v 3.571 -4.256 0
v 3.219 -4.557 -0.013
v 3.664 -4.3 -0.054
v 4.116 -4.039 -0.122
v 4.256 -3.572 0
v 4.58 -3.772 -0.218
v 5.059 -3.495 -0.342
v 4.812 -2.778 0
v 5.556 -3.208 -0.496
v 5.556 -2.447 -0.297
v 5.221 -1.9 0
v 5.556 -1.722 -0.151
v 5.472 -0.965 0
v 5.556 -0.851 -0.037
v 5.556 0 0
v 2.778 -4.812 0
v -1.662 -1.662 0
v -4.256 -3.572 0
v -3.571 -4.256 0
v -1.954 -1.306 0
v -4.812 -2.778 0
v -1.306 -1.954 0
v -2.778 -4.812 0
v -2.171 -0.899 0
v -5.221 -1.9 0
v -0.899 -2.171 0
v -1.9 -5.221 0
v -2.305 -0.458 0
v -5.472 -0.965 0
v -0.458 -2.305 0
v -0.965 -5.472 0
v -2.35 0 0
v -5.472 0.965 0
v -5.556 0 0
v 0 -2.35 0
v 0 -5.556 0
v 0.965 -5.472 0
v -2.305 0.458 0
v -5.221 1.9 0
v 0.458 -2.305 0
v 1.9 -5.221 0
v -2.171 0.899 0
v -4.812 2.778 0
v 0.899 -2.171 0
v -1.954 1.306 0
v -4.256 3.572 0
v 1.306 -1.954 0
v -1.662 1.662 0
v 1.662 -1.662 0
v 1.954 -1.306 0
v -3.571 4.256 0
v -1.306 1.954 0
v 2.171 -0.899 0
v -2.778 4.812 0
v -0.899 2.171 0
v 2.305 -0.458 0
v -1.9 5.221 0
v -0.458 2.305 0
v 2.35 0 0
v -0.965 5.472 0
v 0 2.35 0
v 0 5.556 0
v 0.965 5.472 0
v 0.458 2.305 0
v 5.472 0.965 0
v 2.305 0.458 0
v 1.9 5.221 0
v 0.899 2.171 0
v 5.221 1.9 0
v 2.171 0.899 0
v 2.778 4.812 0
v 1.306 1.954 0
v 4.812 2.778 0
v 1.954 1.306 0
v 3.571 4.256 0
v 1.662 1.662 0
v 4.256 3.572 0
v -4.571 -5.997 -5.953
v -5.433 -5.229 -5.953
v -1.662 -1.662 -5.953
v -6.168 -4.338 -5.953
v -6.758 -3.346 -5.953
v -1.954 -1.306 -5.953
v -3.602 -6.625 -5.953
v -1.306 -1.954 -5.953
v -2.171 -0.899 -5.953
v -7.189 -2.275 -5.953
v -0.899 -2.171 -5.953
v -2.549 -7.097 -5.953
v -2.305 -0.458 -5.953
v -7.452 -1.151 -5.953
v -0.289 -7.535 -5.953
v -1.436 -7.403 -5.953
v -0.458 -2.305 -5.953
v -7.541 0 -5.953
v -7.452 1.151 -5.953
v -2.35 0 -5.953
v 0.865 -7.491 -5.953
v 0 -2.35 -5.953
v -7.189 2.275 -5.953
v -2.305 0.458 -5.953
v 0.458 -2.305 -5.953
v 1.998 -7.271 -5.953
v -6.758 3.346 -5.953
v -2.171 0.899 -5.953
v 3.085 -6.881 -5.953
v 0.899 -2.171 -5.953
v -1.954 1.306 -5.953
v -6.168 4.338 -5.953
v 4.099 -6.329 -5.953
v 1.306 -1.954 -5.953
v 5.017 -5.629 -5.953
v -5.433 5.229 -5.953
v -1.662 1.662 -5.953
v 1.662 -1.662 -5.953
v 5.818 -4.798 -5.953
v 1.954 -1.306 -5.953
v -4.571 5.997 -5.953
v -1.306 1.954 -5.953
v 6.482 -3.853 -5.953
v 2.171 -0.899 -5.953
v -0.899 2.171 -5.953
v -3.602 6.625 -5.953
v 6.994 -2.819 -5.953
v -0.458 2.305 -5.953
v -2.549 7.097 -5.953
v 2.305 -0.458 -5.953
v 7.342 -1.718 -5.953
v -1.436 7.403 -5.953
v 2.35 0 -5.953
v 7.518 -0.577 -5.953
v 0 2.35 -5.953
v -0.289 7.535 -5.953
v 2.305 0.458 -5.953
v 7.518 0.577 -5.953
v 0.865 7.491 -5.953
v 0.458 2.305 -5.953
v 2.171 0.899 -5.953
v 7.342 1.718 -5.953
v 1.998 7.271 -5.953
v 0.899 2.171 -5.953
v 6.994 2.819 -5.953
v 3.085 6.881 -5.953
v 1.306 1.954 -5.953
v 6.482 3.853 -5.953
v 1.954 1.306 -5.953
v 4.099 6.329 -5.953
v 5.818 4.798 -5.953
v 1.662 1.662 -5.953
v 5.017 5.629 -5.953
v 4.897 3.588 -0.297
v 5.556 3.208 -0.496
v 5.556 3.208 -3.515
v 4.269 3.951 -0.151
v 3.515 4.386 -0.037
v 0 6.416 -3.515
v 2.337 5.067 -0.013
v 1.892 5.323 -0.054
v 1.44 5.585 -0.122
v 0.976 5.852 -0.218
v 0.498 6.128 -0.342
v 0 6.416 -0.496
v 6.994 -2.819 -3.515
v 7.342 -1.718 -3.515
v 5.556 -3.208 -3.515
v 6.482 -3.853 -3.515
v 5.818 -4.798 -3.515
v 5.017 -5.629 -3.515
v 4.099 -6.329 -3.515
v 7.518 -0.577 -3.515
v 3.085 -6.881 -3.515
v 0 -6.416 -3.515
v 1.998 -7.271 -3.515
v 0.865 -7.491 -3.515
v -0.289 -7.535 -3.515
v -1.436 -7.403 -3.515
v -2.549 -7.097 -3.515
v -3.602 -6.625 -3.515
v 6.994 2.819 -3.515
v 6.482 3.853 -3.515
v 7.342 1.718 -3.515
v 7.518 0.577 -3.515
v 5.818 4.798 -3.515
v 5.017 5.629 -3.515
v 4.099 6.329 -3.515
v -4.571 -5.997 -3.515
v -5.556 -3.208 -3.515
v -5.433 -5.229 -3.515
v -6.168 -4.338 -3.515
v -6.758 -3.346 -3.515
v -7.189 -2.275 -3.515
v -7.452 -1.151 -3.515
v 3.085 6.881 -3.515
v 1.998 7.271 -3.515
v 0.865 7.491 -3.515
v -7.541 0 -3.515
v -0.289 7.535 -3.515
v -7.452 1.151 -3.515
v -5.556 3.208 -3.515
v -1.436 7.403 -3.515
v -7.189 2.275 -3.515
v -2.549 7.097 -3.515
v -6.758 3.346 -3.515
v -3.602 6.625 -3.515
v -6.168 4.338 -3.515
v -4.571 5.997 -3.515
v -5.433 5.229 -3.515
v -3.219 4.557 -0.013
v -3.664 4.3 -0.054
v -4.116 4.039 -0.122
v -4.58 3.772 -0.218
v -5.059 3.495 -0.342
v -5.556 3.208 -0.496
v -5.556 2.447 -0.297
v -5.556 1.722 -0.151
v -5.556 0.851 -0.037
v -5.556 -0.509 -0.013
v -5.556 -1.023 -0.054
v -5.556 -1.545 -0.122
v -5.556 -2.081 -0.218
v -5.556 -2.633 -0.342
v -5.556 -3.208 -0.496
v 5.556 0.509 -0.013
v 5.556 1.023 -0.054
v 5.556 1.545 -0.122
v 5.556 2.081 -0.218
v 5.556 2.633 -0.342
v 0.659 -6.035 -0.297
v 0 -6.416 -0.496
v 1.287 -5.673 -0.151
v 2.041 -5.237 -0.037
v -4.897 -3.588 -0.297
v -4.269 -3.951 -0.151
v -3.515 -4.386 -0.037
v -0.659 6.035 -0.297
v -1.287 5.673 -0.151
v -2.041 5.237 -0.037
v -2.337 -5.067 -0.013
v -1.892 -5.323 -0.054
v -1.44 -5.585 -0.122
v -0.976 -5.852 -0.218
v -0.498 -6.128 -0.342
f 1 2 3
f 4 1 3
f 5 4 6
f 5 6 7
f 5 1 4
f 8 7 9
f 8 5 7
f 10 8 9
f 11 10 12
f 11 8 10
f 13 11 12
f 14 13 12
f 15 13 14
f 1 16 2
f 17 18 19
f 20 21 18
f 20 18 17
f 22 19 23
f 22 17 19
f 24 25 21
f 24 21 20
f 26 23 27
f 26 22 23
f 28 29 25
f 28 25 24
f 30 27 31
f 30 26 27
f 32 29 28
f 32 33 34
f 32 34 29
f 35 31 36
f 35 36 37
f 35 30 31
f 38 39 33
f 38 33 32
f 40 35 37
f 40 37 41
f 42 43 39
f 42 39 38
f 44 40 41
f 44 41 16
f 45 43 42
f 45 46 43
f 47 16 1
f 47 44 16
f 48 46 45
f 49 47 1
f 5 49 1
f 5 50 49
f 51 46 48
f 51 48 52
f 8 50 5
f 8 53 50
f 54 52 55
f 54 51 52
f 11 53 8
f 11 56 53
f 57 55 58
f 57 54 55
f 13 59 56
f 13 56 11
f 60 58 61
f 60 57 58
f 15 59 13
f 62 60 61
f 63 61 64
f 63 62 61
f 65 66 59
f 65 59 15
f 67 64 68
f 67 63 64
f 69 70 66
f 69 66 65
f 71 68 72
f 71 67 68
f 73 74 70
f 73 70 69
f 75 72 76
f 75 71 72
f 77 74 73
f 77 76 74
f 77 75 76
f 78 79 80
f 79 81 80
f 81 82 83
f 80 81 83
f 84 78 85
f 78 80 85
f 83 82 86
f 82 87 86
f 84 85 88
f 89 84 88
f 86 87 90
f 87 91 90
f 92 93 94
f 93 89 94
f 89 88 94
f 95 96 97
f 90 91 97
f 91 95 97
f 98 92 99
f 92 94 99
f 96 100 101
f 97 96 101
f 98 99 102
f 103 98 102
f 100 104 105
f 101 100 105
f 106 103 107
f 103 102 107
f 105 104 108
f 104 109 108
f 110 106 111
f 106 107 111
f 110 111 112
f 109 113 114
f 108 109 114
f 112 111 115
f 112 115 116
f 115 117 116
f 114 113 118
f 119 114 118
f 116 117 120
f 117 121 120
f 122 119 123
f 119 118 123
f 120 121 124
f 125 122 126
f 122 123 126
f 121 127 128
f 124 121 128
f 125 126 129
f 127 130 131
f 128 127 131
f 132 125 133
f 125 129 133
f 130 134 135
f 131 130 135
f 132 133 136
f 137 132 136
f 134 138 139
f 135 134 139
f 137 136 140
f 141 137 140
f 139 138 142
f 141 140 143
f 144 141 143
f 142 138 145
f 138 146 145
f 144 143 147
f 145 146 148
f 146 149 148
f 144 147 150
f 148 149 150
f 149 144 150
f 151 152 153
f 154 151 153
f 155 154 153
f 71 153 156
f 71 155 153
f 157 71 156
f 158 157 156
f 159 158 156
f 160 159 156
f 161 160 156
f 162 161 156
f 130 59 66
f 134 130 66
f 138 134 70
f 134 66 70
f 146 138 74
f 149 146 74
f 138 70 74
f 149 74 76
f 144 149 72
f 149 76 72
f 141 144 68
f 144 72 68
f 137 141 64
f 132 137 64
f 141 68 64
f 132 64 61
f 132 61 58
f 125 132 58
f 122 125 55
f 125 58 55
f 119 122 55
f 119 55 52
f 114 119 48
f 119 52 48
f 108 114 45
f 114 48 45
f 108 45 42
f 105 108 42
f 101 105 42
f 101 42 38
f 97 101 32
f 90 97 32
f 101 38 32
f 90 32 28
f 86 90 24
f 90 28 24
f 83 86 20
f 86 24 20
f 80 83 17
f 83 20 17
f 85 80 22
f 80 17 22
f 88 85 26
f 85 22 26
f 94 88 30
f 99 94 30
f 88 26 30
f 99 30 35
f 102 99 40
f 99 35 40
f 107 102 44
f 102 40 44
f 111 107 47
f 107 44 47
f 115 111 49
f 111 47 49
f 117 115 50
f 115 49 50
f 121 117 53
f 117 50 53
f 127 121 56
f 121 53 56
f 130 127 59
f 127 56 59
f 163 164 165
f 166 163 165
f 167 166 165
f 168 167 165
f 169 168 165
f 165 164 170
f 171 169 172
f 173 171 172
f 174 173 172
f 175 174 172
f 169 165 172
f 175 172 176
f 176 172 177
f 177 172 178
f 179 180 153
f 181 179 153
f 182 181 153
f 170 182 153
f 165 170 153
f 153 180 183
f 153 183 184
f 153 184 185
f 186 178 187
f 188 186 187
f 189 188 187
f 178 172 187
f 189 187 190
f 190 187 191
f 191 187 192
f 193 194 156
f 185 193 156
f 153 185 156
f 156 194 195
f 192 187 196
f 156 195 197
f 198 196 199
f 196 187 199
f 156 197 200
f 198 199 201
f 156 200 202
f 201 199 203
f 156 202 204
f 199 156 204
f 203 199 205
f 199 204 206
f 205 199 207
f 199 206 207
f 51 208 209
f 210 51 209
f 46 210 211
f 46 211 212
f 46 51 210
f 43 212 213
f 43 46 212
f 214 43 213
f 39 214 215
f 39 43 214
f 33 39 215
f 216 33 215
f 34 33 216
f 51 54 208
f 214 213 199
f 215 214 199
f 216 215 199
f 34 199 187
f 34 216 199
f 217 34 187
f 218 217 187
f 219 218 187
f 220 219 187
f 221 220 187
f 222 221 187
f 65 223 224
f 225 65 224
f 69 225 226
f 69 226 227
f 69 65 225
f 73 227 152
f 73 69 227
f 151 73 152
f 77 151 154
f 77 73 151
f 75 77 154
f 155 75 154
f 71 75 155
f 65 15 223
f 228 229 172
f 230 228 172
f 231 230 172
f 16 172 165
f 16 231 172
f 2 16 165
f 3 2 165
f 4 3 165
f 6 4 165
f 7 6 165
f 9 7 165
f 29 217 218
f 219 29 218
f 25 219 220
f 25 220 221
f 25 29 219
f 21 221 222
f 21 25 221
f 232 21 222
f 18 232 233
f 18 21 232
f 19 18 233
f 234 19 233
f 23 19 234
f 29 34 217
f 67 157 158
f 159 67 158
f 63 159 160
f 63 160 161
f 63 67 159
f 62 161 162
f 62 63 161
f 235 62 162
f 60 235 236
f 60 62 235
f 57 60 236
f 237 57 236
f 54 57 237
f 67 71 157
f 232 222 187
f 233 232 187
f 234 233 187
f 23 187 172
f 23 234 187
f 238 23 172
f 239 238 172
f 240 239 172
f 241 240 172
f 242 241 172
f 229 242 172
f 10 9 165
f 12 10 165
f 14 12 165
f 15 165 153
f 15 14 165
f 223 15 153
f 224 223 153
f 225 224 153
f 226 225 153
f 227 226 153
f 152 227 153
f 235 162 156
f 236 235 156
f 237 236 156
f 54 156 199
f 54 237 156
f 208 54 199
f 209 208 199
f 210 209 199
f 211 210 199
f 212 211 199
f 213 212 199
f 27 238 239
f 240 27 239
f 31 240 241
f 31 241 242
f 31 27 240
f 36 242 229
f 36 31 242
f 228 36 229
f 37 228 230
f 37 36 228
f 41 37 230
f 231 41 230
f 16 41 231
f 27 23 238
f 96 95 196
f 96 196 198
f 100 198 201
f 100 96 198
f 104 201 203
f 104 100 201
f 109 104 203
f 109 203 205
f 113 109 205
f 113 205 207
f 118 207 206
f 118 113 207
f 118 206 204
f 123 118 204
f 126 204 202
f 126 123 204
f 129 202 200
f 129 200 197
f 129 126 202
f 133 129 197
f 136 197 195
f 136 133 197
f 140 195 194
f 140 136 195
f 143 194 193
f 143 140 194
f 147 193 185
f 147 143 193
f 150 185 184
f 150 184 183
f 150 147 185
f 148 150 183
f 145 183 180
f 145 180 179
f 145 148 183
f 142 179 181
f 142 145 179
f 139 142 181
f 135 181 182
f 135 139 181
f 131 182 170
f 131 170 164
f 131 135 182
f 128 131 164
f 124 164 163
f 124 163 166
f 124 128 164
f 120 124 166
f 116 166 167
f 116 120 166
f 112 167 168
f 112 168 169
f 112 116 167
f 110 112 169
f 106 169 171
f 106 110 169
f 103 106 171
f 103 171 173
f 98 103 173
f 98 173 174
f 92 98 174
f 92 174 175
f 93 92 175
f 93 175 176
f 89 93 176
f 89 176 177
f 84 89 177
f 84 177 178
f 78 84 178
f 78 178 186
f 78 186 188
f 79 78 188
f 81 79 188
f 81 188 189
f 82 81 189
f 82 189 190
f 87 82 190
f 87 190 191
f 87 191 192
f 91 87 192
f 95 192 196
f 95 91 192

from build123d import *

# Parameters (mm, degrees)
EXTRUDE1_DEPTH     = 5.953125
SKETCH13_R         = 7.540625
EXTRUDE3_DEPTH     = 2.4384
SKETCH2_OUTSIDE_W  = 67.282
SKETCH2_OUTSIDE_H  = 67.282
SKETCH2_OUTSIDE_R  = 5.55625
CUT_EXTRUDE1_DEPTH = 13.213179277
CUT_EXTRUDE1_DRAFT = -60
SKETCH4_R          = 3.175
CUT_EXTRUDE3_DEPTH = 13.213179277
SKETCH12_R         = 3.175
SKETCH12_R_2       = 2.350110803
EXTRUDE2_DEPTH     = 5.953125


with BuildPart() as part:
    # Sketch1 → Extrude1 (new body)
    with BuildSketch(Plane.XY):
        Polygon((0, 6.415804866), (-5.55625, 3.207902433), (-5.55625, -3.207902433), (0, -6.415804866), (5.55625, -3.207902433), (5.55625, 3.207902433), align=None)
    extrude(amount=-EXTRUDE1_DEPTH)

    # Sketch13 → Extrude3 (add)
    with BuildSketch(Plane(origin=(0, 0, -5.953125), x_dir=(-1, 0, 0), z_dir=(0, 0, -1))):
        Circle(SKETCH13_R)
    extrude(amount=-EXTRUDE3_DEPTH)


with BuildPart() as cut_extrude1_tool:
    # Sketch2 outside → Cut-Extrude1 (with draft: the straight prism first)
    with BuildSketch(Plane.XY):
        Rectangle(SKETCH2_OUTSIDE_W, SKETCH2_OUTSIDE_H)
        Circle(SKETCH2_OUTSIDE_R, mode=Mode.SUBTRACT)
    extrude(amount=-CUT_EXTRUDE1_DEPTH)
    # Cut-Extrude1: the draft: its side faces are tilted about the plane it starts from
    cut_extrude1_sides = [cut_extrude1_tool.faces().sort_by_distance(p)[0] for p in [
        (0, -33.641, -6.606589638),
        (33.641, 0, -6.606589638),
        (0, 33.641, -6.606589638),
        (-33.641, 0, -6.606589638),
        (-5.55625, 0, -6.606589638),
    ]]
    draft(cut_extrude1_sides, Plane.XY, CUT_EXTRUDE1_DRAFT)


with BuildPart() as part_1:
    add(part.part)

    # Cut-Extrude1: cut by cut_extrude1_tool
    add(cut_extrude1_tool.part, mode=Mode.SUBTRACT)

    # Sketch4 → Cut-Extrude3 (cut, through all)
    with BuildSketch(Plane.XY):
        Circle(SKETCH4_R)
    extrude(amount=-CUT_EXTRUDE3_DEPTH, mode=Mode.SUBTRACT)

    # Sketch12 → Extrude2 (add)
    with BuildSketch(Plane.XY):
        Circle(SKETCH12_R)
        Circle(SKETCH12_R_2, mode=Mode.SUBTRACT)
    extrude(amount=-EXTRUDE2_DEPTH)


solid = part_1.part
